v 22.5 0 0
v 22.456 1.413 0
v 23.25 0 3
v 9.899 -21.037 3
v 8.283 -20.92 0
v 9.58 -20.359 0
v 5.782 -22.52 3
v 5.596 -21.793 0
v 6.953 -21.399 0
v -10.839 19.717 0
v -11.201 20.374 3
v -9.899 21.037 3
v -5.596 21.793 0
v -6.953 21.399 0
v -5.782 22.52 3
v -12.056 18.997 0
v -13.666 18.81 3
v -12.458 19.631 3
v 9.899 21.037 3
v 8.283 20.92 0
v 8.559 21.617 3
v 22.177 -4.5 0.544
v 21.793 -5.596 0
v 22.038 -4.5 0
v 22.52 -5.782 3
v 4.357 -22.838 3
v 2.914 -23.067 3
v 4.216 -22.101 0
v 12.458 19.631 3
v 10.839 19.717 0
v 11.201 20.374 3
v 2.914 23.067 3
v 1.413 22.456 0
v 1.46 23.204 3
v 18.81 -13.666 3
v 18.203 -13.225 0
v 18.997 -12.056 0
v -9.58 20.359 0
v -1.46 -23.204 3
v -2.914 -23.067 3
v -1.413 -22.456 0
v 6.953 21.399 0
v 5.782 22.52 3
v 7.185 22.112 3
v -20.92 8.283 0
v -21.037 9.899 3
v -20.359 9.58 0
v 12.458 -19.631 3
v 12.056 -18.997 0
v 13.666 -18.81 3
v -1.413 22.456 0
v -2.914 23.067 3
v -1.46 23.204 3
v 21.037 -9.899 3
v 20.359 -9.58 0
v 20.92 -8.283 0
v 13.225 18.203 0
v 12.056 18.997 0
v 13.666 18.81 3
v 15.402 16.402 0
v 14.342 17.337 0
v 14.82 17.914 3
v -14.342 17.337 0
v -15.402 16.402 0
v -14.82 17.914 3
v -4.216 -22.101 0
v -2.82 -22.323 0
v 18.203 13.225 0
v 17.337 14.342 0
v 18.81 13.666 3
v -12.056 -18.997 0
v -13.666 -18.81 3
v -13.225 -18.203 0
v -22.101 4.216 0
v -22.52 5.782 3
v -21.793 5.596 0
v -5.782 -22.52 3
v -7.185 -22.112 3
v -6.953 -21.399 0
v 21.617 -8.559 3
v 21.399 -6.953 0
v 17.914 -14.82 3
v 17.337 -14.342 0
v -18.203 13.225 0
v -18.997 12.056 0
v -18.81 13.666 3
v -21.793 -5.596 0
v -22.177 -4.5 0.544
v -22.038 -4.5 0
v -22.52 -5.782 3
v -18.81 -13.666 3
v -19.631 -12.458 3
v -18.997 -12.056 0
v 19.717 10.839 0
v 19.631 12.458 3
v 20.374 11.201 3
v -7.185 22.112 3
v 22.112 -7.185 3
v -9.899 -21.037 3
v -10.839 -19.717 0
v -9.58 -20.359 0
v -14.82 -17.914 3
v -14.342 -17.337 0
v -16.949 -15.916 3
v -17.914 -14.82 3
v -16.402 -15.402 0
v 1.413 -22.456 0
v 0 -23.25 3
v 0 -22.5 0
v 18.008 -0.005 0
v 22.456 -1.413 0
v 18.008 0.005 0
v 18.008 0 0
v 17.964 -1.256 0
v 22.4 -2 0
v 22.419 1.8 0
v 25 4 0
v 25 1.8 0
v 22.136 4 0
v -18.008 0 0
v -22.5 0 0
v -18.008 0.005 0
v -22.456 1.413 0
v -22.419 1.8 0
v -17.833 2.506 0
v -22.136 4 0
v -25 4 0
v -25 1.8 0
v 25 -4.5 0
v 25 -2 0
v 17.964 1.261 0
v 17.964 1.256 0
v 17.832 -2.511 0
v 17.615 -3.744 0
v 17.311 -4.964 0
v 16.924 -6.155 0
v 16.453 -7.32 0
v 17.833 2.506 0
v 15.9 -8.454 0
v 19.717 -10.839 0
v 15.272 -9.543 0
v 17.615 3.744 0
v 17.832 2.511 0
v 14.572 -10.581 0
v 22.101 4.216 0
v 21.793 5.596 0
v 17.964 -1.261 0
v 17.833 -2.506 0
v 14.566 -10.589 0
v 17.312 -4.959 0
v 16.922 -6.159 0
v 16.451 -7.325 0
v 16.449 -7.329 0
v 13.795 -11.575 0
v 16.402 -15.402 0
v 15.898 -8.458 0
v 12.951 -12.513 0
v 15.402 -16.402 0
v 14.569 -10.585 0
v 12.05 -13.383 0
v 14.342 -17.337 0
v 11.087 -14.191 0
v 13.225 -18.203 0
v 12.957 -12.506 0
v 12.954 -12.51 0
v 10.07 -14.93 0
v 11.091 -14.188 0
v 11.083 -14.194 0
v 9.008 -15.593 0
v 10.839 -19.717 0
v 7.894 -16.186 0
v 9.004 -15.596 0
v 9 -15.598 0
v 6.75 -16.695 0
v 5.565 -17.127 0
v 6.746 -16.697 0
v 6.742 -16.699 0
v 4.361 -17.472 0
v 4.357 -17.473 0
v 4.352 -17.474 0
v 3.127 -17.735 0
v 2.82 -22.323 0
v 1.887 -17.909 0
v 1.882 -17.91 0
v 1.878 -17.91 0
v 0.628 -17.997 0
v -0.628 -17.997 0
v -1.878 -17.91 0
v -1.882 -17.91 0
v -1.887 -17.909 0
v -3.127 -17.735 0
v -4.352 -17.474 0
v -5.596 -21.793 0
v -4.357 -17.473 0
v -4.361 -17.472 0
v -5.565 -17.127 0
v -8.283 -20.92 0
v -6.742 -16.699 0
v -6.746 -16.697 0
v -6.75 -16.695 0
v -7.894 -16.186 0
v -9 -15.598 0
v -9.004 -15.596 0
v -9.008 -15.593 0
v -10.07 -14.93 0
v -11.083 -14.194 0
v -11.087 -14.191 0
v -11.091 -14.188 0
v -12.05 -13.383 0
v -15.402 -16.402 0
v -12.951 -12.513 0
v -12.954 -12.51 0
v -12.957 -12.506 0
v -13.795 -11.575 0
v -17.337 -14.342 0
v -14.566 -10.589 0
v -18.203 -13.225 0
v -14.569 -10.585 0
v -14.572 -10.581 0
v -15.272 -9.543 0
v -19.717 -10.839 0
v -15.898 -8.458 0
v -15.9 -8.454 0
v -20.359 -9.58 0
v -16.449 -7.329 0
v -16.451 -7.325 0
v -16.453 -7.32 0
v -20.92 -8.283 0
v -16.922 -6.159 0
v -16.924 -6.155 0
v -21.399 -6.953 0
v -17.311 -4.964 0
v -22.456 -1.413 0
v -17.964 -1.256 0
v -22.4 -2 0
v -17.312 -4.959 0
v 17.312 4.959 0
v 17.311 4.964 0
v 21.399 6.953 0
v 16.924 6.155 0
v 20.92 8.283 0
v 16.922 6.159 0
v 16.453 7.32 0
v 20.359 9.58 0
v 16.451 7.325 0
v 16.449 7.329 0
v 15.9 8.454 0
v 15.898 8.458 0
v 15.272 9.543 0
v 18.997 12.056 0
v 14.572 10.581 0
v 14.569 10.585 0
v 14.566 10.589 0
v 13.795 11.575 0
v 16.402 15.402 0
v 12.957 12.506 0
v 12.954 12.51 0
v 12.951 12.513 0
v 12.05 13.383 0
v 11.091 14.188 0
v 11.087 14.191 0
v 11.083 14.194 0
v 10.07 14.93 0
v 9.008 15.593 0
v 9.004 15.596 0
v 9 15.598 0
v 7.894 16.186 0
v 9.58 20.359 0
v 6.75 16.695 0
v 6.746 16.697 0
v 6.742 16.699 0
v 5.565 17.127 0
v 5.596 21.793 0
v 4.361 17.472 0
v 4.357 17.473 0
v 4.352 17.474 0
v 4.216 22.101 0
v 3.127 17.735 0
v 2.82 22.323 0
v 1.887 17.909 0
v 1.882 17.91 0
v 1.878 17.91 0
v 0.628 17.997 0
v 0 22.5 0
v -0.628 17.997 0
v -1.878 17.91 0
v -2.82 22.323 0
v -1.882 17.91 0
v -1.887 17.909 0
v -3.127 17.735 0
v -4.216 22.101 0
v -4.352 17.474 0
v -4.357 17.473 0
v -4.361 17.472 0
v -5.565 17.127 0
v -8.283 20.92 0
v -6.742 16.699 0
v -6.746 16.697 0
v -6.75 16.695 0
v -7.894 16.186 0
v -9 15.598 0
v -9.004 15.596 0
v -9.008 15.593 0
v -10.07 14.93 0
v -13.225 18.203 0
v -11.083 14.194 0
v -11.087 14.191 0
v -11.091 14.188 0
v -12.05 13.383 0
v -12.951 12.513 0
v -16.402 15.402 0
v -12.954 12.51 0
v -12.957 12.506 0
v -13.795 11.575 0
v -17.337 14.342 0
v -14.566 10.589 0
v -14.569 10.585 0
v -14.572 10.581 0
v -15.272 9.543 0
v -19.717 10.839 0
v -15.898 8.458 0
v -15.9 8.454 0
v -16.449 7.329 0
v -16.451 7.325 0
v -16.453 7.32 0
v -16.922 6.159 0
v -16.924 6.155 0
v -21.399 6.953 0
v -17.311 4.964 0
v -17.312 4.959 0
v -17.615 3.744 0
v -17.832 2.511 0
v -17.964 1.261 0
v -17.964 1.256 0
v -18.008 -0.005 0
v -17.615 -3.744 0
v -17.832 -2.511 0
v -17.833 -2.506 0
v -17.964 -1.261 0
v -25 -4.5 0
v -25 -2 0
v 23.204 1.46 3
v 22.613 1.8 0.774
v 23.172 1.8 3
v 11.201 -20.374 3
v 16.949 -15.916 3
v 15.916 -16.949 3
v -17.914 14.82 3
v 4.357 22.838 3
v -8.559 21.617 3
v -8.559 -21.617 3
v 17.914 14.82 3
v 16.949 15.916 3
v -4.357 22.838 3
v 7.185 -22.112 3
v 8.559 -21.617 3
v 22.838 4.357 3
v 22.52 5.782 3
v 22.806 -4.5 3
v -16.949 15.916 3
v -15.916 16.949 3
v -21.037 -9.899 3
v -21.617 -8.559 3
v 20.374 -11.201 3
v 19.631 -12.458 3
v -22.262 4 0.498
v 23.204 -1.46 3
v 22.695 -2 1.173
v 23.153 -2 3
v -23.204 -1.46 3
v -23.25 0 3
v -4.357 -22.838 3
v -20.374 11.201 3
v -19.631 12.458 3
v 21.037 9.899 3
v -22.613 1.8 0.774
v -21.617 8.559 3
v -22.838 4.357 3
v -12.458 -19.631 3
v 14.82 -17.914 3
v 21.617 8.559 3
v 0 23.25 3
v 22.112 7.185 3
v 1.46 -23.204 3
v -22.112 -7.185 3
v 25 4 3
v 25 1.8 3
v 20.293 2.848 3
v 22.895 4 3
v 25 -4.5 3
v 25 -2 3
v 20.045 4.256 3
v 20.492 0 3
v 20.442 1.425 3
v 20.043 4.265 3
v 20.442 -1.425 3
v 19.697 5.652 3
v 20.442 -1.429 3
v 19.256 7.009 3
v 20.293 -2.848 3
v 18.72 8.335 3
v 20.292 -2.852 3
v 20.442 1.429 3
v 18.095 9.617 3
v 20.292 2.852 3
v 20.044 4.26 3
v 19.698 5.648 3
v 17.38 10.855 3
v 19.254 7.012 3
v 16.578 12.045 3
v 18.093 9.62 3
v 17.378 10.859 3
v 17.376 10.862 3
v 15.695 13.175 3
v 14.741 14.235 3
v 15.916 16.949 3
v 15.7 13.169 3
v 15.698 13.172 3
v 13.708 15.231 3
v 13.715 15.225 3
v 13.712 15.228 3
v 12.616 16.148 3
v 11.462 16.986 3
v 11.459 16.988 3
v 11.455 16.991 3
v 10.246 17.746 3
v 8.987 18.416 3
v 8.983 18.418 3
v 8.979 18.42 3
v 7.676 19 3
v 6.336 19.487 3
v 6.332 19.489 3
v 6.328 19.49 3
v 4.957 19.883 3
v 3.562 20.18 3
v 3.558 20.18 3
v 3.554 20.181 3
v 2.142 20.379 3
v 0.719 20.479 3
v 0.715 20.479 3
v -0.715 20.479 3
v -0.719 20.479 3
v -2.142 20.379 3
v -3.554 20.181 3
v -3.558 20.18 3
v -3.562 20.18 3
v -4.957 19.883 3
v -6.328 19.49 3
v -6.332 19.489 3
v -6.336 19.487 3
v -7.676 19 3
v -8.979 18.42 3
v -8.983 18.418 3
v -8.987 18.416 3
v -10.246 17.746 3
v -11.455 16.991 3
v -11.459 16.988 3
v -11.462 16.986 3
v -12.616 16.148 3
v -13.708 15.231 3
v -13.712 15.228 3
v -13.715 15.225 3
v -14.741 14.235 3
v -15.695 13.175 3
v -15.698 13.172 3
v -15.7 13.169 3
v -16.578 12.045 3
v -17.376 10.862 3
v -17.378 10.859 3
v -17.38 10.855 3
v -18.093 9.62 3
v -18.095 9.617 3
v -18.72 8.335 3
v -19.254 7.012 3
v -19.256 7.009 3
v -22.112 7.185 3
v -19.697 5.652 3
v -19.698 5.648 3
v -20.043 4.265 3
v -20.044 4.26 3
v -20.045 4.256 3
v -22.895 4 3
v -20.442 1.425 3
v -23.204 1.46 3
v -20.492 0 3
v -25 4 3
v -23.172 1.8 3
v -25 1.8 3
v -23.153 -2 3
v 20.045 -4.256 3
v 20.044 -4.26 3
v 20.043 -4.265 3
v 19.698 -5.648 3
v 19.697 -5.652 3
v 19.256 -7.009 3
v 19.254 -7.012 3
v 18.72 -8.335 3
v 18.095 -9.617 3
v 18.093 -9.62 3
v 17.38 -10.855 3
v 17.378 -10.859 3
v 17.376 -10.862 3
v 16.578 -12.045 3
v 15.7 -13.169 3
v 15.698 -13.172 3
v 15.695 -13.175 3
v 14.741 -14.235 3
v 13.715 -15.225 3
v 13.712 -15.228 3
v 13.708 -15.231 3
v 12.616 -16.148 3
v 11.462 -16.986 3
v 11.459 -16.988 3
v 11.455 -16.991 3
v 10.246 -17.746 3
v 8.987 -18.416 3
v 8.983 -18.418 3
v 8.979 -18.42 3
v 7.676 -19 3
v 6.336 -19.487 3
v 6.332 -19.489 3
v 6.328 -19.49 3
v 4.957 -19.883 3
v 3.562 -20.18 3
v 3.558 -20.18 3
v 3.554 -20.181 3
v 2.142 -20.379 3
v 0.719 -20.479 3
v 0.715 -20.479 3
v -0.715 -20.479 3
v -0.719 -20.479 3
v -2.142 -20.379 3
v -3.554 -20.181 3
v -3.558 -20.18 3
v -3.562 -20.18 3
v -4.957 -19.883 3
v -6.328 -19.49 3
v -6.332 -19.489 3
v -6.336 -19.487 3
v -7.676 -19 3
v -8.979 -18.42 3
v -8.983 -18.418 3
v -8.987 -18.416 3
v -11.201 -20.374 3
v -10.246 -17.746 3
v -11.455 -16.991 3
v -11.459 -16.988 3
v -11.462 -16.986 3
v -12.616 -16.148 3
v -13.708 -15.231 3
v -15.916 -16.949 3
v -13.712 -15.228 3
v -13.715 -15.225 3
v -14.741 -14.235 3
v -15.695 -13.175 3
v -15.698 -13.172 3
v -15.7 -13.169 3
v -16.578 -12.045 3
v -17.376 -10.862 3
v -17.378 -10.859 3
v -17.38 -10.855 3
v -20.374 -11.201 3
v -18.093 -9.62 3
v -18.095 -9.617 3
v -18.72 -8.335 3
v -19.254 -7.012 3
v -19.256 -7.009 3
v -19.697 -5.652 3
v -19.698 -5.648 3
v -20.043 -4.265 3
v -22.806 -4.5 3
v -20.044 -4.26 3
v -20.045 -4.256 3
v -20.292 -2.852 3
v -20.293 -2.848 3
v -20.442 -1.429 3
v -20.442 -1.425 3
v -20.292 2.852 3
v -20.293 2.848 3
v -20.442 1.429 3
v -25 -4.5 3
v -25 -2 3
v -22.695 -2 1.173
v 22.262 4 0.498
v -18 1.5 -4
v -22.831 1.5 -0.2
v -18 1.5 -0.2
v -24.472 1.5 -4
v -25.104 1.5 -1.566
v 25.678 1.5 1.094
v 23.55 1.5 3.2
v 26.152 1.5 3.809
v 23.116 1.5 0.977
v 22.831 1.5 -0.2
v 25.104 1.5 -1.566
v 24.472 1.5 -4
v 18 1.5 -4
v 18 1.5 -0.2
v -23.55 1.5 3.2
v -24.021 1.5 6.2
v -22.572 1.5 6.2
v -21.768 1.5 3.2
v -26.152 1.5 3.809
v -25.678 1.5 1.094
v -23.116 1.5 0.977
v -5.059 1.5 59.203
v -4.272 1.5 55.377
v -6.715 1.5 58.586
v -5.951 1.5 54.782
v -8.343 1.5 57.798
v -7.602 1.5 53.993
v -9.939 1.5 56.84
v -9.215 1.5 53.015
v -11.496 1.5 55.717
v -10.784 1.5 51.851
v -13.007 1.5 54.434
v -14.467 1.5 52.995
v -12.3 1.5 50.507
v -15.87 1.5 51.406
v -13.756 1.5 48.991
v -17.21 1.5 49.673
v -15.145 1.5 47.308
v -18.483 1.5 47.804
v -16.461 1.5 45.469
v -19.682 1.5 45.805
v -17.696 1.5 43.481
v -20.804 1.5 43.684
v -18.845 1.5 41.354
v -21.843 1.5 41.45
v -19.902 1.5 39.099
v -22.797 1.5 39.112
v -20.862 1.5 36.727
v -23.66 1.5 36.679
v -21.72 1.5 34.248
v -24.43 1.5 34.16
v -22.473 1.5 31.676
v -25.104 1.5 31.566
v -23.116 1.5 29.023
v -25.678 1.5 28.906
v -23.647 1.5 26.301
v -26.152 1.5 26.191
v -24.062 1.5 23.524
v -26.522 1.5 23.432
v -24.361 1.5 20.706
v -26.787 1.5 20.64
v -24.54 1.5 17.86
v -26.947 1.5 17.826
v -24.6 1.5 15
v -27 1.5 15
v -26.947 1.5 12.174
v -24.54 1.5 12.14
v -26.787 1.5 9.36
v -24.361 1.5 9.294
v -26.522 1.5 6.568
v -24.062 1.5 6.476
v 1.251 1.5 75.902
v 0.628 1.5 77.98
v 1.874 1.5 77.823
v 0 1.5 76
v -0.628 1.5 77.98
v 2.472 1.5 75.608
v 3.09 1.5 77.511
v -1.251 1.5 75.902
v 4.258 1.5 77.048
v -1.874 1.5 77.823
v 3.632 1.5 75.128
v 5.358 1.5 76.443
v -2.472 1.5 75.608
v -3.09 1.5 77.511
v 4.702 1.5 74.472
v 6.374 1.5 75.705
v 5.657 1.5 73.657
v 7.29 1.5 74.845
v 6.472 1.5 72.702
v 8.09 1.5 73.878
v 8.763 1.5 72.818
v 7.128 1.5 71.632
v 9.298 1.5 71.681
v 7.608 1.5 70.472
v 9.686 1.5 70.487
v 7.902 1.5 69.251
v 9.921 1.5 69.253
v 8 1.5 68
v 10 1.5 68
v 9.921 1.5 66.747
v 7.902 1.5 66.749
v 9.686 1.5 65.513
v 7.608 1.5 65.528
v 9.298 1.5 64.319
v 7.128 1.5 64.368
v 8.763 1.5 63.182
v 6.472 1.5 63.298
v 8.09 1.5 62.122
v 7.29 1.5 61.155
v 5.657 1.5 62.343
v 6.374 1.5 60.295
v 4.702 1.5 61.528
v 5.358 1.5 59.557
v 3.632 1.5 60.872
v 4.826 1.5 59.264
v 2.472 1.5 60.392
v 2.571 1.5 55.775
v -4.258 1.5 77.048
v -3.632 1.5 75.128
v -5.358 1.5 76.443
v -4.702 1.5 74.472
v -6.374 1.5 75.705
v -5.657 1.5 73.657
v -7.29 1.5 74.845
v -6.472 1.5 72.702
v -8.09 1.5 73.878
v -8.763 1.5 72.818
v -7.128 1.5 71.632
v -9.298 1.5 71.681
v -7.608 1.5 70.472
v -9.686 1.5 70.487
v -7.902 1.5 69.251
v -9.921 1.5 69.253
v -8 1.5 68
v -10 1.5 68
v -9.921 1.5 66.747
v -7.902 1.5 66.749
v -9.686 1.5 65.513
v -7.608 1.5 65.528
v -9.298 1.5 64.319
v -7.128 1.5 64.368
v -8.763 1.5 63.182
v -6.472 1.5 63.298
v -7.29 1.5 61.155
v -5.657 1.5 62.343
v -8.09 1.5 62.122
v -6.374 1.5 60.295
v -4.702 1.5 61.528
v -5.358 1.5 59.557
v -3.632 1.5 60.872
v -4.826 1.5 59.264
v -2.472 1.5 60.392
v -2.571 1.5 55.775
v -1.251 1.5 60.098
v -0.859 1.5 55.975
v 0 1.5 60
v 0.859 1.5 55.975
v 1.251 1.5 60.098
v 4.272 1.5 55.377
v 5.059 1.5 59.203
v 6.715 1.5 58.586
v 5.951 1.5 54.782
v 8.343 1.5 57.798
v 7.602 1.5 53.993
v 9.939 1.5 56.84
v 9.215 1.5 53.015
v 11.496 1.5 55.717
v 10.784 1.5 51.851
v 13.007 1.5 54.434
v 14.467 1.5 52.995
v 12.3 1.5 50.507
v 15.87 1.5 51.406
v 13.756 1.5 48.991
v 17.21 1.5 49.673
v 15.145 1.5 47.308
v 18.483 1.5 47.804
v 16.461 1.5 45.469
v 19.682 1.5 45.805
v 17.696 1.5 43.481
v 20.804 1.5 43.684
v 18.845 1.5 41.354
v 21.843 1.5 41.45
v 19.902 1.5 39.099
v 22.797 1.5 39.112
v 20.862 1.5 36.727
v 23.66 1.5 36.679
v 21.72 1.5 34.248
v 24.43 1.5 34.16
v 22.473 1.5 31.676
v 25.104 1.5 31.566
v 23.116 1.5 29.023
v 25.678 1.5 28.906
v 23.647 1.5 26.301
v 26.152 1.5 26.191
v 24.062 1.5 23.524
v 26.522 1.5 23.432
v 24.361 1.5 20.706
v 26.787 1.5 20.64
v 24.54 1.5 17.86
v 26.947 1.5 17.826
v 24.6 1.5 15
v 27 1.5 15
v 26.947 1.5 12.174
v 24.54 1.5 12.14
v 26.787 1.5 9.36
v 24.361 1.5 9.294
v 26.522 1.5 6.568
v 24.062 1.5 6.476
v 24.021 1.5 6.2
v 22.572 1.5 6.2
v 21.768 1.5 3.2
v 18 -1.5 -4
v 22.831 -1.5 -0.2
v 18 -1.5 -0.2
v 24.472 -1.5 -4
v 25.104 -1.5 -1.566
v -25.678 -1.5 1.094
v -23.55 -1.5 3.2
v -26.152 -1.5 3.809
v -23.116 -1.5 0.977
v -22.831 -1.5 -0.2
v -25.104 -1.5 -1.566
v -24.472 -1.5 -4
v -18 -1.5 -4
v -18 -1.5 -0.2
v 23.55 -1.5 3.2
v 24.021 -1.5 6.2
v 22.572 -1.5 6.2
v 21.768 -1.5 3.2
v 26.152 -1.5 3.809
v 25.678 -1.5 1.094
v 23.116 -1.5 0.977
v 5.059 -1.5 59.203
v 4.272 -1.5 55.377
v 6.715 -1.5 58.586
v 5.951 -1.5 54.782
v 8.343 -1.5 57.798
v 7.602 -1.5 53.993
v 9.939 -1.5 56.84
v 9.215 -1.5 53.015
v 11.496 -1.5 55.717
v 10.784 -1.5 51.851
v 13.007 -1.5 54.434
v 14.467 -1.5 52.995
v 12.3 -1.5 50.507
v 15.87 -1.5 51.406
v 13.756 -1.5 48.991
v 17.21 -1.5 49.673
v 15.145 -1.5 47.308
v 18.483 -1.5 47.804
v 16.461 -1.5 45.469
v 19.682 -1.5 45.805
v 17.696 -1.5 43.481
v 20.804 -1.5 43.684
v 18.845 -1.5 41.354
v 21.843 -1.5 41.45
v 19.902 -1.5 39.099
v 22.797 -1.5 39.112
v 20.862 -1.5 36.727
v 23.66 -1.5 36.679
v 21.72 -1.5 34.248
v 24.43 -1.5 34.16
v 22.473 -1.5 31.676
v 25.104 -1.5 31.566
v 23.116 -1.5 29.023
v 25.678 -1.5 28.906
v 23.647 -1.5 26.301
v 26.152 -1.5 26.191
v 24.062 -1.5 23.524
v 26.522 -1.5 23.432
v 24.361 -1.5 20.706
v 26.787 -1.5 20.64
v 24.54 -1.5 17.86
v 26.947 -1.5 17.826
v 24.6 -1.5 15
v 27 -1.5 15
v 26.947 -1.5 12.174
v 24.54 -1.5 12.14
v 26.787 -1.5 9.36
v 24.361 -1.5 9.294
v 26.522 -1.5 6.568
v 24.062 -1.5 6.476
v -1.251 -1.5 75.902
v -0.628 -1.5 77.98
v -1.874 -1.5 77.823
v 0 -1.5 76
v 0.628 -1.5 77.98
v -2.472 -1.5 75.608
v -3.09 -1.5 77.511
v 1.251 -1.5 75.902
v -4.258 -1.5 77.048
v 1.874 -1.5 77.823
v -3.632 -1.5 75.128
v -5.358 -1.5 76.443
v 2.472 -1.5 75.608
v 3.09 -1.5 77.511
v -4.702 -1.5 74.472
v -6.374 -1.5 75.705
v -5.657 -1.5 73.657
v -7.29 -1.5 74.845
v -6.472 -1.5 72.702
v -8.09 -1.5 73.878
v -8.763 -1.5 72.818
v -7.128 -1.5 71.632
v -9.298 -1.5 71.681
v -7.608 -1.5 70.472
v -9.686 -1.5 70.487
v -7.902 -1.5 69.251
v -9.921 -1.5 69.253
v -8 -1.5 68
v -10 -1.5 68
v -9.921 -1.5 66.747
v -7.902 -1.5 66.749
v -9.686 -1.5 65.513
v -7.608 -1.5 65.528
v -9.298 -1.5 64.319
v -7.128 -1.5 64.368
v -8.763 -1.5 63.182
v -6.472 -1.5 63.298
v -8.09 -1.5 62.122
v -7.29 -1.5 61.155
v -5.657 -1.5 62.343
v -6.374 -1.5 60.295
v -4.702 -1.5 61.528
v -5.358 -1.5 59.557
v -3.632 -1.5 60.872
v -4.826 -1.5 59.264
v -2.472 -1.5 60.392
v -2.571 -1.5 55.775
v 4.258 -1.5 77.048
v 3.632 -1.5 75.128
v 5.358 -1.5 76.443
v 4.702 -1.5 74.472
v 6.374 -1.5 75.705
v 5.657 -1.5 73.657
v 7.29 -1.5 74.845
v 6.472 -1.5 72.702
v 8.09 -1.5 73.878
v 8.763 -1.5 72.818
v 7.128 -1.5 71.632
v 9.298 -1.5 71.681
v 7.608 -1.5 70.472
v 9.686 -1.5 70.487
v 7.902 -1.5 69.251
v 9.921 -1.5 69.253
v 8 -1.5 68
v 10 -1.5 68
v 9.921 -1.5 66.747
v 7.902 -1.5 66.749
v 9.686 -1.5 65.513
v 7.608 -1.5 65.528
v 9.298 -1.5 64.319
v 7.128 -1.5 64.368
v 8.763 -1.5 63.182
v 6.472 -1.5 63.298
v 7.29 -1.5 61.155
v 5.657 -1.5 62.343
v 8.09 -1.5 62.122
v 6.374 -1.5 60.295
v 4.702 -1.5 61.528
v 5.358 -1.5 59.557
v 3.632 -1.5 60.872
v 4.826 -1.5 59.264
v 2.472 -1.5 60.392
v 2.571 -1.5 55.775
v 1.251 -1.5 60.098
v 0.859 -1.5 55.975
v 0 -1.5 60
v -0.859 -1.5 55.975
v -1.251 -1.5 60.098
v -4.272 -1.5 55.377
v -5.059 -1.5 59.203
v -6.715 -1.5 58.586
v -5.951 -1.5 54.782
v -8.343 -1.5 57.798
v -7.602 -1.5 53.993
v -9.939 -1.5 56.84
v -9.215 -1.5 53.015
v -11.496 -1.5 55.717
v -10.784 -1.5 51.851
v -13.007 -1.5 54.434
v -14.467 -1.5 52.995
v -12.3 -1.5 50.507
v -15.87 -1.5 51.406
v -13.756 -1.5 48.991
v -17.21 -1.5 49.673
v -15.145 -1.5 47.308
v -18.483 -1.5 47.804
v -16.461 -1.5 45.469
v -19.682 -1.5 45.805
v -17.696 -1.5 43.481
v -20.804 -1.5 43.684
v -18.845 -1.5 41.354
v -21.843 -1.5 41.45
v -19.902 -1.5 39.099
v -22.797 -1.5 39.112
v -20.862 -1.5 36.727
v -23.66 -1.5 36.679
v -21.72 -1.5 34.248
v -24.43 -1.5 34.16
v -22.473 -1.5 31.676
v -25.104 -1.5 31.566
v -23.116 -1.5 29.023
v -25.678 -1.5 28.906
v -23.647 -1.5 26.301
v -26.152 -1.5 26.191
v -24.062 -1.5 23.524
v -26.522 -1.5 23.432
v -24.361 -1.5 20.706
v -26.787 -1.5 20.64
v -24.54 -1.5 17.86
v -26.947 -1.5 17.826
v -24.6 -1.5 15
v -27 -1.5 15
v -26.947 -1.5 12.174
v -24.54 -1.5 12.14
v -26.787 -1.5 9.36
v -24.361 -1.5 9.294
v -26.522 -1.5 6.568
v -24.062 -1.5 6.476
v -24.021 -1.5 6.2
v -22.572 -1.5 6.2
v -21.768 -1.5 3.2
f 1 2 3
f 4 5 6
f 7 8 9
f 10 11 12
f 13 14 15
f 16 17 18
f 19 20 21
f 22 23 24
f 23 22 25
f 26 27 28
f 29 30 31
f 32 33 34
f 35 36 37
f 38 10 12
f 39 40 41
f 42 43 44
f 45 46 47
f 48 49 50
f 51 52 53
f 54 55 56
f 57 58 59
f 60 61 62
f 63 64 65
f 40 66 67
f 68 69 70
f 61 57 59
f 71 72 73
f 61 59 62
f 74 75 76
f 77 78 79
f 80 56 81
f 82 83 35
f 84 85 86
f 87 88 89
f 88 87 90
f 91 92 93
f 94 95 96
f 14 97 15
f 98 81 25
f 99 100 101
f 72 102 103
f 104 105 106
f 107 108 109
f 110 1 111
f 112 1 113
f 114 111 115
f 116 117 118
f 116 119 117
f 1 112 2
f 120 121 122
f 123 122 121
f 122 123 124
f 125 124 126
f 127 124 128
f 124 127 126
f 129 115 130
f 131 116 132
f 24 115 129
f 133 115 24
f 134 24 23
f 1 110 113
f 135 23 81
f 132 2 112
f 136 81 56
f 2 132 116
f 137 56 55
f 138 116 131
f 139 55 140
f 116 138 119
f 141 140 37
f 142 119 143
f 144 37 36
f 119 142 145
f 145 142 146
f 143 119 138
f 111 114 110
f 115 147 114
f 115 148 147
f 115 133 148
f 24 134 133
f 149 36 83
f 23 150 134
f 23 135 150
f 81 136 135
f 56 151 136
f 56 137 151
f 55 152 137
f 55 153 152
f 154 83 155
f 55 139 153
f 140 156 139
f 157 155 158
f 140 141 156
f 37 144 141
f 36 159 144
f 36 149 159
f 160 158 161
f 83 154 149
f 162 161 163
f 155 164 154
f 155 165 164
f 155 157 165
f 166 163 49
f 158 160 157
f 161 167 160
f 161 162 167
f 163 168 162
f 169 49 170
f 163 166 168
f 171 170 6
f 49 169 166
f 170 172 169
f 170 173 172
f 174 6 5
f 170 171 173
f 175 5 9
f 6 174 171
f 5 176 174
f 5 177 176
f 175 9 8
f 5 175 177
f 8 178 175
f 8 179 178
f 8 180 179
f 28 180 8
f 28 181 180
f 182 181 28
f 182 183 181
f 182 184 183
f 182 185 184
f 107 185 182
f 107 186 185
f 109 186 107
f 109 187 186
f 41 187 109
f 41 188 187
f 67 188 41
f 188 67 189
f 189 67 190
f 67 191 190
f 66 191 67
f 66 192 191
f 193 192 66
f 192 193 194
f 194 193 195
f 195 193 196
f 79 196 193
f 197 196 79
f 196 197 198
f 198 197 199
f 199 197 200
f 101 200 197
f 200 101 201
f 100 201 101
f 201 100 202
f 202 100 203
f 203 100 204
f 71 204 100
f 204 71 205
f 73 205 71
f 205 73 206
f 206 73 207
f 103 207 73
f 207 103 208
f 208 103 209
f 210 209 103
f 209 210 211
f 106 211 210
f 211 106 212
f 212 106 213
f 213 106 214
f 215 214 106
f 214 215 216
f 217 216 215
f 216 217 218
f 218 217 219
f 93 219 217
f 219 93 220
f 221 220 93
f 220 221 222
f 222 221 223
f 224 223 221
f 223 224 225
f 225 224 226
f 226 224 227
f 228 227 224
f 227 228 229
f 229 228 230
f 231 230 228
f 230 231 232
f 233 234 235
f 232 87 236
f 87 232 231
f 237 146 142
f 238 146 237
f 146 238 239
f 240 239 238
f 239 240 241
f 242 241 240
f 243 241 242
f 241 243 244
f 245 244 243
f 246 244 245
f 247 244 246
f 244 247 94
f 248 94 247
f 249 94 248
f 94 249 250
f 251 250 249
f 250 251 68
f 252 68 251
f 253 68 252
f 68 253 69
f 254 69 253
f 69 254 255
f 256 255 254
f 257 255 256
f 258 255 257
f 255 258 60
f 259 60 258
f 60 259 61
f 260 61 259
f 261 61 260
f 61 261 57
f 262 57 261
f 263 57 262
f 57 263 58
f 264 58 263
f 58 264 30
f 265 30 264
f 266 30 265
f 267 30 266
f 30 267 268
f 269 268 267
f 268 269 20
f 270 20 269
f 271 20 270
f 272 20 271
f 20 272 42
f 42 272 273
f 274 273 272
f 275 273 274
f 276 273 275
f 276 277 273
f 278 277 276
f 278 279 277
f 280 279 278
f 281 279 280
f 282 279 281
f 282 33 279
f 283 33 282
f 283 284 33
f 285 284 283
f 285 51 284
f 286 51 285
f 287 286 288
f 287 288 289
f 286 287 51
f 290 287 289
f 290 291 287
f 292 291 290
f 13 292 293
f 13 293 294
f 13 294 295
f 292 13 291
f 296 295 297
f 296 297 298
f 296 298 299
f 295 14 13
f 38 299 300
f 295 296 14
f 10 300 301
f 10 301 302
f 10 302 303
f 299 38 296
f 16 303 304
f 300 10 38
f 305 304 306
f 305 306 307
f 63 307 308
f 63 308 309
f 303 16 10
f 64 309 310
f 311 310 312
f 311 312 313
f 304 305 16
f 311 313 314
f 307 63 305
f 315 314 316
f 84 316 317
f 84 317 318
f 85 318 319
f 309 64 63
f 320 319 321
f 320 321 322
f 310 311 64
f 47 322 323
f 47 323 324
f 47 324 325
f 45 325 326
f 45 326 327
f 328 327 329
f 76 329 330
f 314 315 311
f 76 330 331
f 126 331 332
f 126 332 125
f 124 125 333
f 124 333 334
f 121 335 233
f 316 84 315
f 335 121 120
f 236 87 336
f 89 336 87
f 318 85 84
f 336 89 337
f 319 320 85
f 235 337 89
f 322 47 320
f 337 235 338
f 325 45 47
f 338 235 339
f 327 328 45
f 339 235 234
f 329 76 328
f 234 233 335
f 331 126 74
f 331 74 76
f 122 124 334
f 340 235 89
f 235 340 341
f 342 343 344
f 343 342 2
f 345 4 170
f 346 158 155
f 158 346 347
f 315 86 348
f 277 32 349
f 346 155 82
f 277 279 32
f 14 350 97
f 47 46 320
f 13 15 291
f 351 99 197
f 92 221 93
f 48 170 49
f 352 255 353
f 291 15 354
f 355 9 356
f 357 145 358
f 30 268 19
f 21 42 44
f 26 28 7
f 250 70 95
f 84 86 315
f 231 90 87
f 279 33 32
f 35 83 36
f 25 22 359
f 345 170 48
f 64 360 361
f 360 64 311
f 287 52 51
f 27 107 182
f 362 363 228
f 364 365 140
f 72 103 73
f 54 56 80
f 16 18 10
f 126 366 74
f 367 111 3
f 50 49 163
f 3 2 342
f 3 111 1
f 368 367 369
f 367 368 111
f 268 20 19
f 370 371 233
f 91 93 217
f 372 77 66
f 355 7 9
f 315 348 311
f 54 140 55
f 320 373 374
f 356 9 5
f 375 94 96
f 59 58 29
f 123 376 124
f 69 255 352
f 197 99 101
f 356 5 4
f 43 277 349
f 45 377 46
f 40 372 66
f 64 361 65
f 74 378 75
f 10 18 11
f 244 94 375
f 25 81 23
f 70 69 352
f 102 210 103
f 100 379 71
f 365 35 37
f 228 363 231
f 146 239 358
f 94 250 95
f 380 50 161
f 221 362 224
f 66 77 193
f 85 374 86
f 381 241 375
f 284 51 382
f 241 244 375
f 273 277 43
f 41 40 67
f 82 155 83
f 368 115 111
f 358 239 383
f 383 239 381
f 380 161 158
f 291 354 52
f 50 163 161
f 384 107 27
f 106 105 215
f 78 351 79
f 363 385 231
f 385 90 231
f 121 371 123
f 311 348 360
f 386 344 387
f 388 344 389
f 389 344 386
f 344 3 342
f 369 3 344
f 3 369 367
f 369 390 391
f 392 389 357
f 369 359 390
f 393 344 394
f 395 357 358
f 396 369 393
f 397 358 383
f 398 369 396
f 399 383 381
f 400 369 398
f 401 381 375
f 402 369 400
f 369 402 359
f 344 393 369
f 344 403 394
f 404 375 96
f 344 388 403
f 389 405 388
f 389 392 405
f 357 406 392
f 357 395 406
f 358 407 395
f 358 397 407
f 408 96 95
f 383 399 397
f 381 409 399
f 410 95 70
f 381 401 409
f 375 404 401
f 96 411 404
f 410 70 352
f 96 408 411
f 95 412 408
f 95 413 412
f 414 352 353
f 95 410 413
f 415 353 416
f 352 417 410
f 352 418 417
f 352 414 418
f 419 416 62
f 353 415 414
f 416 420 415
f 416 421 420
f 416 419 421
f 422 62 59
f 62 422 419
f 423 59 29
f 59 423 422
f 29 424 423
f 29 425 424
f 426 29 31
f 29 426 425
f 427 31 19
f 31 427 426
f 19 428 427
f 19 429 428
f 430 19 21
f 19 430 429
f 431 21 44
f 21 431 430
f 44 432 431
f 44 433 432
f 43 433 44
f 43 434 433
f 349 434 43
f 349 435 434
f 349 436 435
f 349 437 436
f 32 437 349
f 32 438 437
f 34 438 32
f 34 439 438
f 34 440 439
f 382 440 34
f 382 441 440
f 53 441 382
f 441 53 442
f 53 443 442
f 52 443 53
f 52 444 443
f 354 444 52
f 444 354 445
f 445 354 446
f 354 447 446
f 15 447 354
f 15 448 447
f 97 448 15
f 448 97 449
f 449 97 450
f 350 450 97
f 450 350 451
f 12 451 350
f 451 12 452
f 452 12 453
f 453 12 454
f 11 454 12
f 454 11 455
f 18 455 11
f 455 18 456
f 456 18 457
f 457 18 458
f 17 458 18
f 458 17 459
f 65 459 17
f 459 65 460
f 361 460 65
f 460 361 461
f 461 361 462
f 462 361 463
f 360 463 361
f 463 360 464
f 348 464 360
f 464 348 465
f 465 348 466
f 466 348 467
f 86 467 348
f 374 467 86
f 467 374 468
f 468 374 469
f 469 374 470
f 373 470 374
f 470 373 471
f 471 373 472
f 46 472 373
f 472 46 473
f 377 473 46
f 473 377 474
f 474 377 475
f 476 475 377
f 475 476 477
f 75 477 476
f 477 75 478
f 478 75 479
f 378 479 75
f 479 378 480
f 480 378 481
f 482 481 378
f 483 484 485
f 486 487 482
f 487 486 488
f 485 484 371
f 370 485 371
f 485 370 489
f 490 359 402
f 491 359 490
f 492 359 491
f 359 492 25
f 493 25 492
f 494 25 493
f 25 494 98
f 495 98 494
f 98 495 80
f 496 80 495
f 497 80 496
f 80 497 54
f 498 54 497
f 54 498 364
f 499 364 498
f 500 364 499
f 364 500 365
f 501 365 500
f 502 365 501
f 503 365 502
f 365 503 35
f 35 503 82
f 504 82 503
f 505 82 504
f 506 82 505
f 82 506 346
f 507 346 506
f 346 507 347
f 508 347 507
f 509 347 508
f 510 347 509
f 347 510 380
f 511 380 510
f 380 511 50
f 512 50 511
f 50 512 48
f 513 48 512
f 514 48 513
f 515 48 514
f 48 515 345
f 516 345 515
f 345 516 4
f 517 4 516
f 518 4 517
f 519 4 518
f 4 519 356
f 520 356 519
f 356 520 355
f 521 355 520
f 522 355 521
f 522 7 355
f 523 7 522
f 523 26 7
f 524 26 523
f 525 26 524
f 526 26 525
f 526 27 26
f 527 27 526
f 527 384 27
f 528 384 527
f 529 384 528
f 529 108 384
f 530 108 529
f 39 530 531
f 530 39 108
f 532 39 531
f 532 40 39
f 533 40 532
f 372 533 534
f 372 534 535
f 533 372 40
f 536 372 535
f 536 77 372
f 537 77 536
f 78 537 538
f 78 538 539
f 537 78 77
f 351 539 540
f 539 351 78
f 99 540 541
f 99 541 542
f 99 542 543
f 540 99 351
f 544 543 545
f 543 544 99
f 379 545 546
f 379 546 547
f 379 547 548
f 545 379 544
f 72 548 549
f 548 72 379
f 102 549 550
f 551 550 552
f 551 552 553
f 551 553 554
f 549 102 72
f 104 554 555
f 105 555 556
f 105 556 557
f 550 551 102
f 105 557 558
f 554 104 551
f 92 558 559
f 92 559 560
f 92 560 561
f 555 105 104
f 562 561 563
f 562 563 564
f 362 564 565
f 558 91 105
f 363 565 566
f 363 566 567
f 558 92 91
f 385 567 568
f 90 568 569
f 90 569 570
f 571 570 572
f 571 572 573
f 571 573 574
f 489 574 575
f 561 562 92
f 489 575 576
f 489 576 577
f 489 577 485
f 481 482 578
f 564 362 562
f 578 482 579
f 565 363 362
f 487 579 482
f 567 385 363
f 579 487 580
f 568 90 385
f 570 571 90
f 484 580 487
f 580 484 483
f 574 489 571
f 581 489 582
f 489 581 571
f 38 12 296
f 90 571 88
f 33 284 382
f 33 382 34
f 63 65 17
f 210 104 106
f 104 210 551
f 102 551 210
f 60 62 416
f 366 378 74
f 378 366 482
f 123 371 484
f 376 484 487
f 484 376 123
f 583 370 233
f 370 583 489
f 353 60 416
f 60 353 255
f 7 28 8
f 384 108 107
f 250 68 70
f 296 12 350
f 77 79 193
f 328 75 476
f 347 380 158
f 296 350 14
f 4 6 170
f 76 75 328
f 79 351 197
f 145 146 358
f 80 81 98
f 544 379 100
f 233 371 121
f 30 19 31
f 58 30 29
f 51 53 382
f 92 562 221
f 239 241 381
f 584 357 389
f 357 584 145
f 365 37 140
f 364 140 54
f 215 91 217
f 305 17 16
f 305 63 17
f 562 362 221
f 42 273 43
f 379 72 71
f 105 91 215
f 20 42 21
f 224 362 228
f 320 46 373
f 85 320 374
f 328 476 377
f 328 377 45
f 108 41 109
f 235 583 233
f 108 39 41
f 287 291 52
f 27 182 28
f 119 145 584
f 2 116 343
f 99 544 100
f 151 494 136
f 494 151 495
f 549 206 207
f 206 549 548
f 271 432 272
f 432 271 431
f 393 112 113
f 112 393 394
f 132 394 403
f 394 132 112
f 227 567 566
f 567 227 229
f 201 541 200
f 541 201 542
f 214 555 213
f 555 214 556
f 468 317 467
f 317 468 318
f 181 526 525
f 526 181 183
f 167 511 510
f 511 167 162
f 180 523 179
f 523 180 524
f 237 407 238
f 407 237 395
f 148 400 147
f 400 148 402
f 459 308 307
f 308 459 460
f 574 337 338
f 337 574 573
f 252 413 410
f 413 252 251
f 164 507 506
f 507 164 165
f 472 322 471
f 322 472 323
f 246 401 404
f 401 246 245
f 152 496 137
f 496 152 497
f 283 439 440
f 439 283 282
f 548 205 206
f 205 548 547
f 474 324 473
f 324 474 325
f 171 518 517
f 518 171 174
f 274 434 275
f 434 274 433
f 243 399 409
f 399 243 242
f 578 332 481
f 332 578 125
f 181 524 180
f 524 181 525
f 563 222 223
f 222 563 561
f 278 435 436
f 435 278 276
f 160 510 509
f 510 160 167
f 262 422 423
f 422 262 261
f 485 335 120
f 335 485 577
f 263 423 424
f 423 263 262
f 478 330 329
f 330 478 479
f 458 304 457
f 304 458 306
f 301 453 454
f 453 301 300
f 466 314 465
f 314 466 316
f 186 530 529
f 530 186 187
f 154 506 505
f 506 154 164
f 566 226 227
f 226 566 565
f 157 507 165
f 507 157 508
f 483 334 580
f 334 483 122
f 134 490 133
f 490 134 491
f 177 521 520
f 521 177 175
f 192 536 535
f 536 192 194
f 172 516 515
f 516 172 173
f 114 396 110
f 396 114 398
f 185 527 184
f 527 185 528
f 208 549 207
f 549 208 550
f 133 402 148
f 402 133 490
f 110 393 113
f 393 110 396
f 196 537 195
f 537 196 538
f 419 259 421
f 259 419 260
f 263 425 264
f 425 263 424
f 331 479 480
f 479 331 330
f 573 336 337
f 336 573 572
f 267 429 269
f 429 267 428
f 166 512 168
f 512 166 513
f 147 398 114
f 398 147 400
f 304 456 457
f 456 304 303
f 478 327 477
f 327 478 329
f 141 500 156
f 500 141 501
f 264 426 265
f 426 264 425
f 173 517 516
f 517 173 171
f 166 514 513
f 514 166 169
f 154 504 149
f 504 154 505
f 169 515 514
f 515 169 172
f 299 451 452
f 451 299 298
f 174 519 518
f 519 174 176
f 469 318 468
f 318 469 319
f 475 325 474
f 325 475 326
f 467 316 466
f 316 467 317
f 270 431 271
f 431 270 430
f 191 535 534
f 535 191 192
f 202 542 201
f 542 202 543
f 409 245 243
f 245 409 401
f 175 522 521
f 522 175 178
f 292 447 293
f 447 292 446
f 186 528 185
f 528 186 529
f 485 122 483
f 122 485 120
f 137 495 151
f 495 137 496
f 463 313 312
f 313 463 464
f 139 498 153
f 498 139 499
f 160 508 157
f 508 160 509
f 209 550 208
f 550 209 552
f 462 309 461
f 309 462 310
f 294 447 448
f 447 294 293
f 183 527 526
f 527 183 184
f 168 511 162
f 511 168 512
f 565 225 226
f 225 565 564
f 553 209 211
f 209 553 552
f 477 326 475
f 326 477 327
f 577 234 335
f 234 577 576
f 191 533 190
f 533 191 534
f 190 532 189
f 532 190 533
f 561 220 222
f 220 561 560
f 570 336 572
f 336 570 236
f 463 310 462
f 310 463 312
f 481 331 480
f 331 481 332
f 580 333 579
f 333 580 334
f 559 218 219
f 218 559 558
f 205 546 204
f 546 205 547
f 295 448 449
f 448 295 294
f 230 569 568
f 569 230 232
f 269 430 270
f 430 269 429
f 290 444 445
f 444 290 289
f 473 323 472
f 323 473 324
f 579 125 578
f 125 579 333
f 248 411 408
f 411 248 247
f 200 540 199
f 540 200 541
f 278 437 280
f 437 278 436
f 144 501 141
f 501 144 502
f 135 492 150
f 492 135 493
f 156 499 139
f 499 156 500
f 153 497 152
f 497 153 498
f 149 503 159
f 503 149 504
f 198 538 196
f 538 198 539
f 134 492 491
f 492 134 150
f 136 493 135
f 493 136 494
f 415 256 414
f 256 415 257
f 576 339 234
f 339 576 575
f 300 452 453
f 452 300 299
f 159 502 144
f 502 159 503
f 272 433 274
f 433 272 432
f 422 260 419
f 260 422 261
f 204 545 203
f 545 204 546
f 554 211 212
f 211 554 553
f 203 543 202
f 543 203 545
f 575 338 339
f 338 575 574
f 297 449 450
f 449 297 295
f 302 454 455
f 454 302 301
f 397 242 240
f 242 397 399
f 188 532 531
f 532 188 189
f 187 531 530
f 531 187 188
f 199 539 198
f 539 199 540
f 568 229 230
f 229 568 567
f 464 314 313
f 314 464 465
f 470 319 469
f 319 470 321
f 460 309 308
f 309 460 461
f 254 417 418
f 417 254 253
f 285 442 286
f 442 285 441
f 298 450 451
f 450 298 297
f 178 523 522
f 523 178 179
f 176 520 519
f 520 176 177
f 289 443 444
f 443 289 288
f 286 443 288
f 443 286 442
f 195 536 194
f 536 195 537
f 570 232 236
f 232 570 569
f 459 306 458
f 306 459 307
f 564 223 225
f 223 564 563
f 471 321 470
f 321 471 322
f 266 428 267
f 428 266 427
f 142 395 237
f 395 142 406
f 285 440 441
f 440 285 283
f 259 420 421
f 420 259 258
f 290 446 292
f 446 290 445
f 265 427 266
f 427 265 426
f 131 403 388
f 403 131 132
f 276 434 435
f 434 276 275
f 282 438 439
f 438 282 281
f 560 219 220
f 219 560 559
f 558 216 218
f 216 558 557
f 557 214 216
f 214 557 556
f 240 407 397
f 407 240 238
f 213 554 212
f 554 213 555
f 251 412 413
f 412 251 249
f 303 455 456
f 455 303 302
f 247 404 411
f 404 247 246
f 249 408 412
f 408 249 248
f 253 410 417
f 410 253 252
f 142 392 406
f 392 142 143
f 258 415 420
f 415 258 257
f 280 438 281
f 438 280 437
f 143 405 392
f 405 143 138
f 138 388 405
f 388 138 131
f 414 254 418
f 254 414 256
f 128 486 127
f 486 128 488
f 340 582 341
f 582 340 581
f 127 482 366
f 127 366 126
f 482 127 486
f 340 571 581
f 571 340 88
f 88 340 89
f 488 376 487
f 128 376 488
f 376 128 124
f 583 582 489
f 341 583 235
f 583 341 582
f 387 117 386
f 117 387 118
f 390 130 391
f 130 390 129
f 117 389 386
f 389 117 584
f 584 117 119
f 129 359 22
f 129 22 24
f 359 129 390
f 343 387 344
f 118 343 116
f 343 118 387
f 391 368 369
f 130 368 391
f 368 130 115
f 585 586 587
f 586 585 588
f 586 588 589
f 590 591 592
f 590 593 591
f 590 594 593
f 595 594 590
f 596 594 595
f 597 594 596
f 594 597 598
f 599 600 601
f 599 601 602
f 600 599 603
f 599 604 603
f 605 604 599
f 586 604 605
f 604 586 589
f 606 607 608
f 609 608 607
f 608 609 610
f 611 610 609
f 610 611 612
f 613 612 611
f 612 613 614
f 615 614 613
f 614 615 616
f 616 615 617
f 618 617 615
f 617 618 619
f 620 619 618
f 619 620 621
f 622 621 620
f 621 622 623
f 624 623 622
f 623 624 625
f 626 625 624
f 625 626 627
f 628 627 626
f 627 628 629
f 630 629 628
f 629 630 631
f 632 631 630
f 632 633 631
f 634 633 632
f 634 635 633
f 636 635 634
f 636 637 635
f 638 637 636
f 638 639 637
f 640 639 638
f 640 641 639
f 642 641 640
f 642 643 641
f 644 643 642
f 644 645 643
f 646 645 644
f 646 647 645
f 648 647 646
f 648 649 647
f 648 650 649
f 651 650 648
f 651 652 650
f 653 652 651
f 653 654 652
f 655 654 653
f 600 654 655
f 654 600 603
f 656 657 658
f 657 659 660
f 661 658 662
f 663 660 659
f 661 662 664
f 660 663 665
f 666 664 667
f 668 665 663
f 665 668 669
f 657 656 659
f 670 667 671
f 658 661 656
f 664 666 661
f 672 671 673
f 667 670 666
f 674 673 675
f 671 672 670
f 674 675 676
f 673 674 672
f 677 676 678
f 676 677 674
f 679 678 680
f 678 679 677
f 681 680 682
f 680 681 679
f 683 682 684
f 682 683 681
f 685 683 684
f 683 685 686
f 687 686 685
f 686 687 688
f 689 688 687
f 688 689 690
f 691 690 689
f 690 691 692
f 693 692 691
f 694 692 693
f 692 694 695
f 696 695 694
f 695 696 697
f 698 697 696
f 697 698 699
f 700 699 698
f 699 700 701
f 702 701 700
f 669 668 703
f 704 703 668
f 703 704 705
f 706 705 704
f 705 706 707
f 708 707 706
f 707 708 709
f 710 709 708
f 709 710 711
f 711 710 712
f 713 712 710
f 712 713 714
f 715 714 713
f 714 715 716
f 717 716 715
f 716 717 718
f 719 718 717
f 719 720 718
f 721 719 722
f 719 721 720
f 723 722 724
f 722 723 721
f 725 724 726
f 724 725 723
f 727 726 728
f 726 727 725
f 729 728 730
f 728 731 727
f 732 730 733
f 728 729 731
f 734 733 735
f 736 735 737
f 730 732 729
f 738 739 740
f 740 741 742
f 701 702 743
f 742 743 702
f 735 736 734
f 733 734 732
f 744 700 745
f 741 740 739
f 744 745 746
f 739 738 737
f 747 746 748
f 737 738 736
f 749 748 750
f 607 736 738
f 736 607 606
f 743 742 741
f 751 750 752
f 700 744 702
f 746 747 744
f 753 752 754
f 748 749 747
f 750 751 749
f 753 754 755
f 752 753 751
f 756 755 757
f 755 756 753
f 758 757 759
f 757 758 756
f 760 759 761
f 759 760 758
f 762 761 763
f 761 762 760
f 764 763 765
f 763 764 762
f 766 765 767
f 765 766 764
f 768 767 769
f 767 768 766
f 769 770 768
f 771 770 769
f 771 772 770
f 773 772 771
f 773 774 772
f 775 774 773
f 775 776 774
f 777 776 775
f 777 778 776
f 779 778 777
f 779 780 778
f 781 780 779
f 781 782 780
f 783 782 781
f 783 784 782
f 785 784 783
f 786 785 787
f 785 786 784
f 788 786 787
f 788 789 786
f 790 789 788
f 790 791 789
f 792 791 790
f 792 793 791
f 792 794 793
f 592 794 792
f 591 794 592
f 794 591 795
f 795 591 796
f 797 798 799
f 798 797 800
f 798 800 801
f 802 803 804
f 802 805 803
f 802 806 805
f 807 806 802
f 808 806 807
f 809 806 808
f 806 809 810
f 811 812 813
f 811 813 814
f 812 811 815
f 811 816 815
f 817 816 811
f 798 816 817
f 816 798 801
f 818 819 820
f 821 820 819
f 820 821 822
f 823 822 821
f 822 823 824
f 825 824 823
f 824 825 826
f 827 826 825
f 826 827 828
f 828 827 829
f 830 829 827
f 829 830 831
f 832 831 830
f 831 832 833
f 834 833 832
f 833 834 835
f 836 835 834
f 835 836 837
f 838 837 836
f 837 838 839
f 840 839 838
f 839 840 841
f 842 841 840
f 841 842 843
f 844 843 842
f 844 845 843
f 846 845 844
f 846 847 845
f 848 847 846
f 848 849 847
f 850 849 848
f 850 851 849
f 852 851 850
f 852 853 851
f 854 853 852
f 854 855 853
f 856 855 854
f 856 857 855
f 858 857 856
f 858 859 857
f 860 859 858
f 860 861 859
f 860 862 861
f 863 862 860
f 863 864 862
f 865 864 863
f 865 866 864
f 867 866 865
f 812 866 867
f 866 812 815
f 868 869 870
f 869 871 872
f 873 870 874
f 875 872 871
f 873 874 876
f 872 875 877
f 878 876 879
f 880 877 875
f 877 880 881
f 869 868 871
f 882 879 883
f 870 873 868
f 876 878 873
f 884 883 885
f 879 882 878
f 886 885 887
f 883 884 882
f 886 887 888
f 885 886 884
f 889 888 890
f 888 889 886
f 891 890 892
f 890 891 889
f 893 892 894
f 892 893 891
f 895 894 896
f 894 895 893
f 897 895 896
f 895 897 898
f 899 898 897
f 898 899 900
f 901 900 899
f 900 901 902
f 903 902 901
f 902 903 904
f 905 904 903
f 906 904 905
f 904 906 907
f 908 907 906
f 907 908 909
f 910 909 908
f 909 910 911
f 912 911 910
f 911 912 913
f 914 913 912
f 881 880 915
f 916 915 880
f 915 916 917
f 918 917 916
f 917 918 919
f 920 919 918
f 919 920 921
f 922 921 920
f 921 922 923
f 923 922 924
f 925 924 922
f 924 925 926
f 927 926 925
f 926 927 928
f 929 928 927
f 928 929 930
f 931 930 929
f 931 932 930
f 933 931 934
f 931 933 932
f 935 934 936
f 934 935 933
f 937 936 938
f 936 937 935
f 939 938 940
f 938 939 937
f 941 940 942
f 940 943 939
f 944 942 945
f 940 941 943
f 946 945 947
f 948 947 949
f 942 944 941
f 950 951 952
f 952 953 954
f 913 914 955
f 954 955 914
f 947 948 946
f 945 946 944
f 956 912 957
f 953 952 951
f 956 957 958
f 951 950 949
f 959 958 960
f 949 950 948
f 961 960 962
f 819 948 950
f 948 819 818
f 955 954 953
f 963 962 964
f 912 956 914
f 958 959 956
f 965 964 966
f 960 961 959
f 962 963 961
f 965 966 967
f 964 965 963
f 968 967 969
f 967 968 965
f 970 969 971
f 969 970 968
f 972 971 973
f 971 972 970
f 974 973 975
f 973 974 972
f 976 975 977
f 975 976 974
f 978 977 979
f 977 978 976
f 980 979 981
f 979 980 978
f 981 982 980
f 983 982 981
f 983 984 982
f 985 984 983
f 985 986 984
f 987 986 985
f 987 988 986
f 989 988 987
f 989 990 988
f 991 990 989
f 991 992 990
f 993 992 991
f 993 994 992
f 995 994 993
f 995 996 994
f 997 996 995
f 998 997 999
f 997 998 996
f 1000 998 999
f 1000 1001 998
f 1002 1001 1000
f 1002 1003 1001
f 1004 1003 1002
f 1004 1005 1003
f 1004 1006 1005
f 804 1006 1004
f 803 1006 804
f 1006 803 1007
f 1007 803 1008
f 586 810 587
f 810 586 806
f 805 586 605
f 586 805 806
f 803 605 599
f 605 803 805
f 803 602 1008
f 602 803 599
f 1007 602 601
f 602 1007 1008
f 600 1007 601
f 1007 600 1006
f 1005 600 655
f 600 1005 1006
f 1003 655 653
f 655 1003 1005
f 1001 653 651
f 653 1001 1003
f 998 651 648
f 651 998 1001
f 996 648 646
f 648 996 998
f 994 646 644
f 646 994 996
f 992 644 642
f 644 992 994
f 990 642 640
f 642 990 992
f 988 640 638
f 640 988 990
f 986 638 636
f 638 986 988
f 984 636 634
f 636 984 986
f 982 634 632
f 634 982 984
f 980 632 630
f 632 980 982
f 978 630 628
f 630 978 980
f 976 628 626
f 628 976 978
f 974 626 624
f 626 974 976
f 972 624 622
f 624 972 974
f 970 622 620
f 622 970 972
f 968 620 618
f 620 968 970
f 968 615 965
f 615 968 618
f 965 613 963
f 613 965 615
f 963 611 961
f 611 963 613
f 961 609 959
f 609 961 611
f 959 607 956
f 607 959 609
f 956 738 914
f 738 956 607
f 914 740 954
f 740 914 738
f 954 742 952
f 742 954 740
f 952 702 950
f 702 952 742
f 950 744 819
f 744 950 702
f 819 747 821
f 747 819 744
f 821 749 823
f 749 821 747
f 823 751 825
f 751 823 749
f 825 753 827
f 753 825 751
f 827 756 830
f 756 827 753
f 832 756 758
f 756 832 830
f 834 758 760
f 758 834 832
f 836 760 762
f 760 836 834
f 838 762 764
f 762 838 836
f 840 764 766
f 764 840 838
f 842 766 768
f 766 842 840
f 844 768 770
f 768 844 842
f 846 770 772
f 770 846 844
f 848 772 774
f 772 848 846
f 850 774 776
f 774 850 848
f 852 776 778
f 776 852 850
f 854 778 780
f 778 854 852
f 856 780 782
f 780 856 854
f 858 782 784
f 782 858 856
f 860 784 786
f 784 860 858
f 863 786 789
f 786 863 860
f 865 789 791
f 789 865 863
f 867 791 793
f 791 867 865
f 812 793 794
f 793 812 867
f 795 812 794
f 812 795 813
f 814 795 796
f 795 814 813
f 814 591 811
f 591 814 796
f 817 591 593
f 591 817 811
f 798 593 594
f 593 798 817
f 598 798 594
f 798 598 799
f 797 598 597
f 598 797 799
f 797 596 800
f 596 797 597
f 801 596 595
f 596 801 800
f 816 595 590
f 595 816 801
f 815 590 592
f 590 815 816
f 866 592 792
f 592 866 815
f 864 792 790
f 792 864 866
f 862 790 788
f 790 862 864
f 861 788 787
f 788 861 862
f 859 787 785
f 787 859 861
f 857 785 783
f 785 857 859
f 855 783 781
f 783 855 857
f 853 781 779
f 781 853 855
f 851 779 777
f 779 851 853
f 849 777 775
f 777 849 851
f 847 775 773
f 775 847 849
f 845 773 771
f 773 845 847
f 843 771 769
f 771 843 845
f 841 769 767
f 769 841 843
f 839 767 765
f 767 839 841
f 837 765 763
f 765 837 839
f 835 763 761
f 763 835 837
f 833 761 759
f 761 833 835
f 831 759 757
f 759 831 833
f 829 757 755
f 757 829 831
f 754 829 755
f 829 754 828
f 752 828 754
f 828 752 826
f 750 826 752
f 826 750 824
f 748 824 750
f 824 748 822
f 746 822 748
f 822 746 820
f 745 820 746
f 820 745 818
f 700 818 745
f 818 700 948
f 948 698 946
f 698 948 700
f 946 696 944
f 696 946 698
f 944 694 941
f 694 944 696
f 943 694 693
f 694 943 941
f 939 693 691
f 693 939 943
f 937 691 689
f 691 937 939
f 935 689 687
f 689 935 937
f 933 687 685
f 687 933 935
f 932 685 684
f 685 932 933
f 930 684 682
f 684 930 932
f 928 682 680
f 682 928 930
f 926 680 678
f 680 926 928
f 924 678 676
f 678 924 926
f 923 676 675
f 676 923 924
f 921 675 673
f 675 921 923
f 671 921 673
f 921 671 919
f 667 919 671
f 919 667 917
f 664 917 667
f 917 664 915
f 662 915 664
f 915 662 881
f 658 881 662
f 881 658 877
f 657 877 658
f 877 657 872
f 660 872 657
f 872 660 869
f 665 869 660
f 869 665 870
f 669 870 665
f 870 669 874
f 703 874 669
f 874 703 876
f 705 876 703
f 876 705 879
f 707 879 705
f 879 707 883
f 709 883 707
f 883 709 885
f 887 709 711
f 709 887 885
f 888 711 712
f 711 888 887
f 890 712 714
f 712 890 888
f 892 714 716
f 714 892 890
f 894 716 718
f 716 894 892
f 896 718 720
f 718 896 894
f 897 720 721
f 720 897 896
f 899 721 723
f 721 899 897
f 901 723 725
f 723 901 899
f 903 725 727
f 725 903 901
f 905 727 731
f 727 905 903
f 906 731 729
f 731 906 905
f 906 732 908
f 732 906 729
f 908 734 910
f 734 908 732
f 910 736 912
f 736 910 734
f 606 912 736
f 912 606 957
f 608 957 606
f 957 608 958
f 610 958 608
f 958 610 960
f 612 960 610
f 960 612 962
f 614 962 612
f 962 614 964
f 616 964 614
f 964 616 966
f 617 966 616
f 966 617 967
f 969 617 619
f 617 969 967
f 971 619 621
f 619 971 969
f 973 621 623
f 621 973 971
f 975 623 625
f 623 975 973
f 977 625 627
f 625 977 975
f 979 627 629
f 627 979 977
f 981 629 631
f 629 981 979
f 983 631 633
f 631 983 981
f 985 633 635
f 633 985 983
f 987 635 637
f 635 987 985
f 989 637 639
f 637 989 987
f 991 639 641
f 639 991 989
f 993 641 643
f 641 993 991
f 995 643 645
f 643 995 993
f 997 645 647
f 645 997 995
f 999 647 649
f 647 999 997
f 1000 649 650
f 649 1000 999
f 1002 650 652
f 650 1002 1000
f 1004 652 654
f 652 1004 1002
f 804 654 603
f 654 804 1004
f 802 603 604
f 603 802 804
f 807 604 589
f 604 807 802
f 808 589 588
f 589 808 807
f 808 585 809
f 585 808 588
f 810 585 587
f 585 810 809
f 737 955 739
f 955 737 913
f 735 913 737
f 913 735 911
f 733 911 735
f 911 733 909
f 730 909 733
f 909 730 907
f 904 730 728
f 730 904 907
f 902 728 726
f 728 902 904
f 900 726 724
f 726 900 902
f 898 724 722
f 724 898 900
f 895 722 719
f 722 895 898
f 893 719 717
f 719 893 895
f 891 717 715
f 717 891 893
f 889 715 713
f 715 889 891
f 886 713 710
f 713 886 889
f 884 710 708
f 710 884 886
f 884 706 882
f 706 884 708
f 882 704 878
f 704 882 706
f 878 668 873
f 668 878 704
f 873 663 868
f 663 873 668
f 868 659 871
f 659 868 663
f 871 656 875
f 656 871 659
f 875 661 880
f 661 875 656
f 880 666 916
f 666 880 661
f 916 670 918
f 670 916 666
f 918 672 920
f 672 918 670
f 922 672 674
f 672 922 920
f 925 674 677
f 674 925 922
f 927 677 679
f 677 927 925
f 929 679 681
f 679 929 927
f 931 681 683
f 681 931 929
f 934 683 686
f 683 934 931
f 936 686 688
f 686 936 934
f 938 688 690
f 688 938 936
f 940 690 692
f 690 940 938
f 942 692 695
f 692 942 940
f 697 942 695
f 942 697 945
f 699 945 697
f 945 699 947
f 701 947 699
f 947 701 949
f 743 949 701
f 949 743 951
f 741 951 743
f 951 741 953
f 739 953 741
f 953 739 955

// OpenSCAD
part="all"; // [handle,base,all]
thick=3;
size=47;
//rotate([-90,0])
if(part=="handle")
  rotate([-90,0]) handle();
else if(part=="base")
  base();
else if(part=="all")
{
  handle();
  base();
}
module handle() {
  translate([0,thick/2]) rotate([90,0]) linear_extrude(thick) {
    intersection()
    {
      translate([-30,-4]) square([60,100]);
      union(){
   translate([0,15]) scale([1.2,2]) difference() {
     circle(d=45,$fn=100);
     circle(d=41,$fn=90);
   }
   for(m=[0,1]) mirror([m,0]) {
   translate([-24,-4]) square([6,3.8]);
   translate([-26,thick+.2]) difference(){
     square([4.5,3]);
     translate([4.5,-1]) rotate([0,0,15]) square([5,6]);
   }
   }
   //polygon([[-18,48.5],[-22.5,8], [-20,8],[-20,5.6],[-23,5.6],[-23,-.4], [-20,-.4],[-20,-4],[-25,-4],[-25,5.6], [-20,50],[0,60],[20,50],[25,6],[25,-4], [20,-4],[20,-.4],[23,-.4],[23,5.6], [20,5.6],[20,8],[22.5,8],[18,48.5],[0,57]]);
    translate([0,68]) difference() {
      circle(d=20,$fn=50);
      circle(d=16,$fn=40);
    }
  }
}
  }
}
module base() {
  difference(){
    cylinder(d1=45,d2=45+thick/2,h=thick,$fn=100);
    translate([0,0,-.01]) cylinder(d1=36,d2=41,h=thick+.02,$fn=90);
  }
  for(m=[0,1]) mirror([m,0])
  translate([-25,thick*-1.5])
  difference(){
    cube([thick,thick*3-.5,thick]);
    translate([-.01,thick-.5,-.01]) cube([8,thick+.8,thick+.02]);
  }
    
}
